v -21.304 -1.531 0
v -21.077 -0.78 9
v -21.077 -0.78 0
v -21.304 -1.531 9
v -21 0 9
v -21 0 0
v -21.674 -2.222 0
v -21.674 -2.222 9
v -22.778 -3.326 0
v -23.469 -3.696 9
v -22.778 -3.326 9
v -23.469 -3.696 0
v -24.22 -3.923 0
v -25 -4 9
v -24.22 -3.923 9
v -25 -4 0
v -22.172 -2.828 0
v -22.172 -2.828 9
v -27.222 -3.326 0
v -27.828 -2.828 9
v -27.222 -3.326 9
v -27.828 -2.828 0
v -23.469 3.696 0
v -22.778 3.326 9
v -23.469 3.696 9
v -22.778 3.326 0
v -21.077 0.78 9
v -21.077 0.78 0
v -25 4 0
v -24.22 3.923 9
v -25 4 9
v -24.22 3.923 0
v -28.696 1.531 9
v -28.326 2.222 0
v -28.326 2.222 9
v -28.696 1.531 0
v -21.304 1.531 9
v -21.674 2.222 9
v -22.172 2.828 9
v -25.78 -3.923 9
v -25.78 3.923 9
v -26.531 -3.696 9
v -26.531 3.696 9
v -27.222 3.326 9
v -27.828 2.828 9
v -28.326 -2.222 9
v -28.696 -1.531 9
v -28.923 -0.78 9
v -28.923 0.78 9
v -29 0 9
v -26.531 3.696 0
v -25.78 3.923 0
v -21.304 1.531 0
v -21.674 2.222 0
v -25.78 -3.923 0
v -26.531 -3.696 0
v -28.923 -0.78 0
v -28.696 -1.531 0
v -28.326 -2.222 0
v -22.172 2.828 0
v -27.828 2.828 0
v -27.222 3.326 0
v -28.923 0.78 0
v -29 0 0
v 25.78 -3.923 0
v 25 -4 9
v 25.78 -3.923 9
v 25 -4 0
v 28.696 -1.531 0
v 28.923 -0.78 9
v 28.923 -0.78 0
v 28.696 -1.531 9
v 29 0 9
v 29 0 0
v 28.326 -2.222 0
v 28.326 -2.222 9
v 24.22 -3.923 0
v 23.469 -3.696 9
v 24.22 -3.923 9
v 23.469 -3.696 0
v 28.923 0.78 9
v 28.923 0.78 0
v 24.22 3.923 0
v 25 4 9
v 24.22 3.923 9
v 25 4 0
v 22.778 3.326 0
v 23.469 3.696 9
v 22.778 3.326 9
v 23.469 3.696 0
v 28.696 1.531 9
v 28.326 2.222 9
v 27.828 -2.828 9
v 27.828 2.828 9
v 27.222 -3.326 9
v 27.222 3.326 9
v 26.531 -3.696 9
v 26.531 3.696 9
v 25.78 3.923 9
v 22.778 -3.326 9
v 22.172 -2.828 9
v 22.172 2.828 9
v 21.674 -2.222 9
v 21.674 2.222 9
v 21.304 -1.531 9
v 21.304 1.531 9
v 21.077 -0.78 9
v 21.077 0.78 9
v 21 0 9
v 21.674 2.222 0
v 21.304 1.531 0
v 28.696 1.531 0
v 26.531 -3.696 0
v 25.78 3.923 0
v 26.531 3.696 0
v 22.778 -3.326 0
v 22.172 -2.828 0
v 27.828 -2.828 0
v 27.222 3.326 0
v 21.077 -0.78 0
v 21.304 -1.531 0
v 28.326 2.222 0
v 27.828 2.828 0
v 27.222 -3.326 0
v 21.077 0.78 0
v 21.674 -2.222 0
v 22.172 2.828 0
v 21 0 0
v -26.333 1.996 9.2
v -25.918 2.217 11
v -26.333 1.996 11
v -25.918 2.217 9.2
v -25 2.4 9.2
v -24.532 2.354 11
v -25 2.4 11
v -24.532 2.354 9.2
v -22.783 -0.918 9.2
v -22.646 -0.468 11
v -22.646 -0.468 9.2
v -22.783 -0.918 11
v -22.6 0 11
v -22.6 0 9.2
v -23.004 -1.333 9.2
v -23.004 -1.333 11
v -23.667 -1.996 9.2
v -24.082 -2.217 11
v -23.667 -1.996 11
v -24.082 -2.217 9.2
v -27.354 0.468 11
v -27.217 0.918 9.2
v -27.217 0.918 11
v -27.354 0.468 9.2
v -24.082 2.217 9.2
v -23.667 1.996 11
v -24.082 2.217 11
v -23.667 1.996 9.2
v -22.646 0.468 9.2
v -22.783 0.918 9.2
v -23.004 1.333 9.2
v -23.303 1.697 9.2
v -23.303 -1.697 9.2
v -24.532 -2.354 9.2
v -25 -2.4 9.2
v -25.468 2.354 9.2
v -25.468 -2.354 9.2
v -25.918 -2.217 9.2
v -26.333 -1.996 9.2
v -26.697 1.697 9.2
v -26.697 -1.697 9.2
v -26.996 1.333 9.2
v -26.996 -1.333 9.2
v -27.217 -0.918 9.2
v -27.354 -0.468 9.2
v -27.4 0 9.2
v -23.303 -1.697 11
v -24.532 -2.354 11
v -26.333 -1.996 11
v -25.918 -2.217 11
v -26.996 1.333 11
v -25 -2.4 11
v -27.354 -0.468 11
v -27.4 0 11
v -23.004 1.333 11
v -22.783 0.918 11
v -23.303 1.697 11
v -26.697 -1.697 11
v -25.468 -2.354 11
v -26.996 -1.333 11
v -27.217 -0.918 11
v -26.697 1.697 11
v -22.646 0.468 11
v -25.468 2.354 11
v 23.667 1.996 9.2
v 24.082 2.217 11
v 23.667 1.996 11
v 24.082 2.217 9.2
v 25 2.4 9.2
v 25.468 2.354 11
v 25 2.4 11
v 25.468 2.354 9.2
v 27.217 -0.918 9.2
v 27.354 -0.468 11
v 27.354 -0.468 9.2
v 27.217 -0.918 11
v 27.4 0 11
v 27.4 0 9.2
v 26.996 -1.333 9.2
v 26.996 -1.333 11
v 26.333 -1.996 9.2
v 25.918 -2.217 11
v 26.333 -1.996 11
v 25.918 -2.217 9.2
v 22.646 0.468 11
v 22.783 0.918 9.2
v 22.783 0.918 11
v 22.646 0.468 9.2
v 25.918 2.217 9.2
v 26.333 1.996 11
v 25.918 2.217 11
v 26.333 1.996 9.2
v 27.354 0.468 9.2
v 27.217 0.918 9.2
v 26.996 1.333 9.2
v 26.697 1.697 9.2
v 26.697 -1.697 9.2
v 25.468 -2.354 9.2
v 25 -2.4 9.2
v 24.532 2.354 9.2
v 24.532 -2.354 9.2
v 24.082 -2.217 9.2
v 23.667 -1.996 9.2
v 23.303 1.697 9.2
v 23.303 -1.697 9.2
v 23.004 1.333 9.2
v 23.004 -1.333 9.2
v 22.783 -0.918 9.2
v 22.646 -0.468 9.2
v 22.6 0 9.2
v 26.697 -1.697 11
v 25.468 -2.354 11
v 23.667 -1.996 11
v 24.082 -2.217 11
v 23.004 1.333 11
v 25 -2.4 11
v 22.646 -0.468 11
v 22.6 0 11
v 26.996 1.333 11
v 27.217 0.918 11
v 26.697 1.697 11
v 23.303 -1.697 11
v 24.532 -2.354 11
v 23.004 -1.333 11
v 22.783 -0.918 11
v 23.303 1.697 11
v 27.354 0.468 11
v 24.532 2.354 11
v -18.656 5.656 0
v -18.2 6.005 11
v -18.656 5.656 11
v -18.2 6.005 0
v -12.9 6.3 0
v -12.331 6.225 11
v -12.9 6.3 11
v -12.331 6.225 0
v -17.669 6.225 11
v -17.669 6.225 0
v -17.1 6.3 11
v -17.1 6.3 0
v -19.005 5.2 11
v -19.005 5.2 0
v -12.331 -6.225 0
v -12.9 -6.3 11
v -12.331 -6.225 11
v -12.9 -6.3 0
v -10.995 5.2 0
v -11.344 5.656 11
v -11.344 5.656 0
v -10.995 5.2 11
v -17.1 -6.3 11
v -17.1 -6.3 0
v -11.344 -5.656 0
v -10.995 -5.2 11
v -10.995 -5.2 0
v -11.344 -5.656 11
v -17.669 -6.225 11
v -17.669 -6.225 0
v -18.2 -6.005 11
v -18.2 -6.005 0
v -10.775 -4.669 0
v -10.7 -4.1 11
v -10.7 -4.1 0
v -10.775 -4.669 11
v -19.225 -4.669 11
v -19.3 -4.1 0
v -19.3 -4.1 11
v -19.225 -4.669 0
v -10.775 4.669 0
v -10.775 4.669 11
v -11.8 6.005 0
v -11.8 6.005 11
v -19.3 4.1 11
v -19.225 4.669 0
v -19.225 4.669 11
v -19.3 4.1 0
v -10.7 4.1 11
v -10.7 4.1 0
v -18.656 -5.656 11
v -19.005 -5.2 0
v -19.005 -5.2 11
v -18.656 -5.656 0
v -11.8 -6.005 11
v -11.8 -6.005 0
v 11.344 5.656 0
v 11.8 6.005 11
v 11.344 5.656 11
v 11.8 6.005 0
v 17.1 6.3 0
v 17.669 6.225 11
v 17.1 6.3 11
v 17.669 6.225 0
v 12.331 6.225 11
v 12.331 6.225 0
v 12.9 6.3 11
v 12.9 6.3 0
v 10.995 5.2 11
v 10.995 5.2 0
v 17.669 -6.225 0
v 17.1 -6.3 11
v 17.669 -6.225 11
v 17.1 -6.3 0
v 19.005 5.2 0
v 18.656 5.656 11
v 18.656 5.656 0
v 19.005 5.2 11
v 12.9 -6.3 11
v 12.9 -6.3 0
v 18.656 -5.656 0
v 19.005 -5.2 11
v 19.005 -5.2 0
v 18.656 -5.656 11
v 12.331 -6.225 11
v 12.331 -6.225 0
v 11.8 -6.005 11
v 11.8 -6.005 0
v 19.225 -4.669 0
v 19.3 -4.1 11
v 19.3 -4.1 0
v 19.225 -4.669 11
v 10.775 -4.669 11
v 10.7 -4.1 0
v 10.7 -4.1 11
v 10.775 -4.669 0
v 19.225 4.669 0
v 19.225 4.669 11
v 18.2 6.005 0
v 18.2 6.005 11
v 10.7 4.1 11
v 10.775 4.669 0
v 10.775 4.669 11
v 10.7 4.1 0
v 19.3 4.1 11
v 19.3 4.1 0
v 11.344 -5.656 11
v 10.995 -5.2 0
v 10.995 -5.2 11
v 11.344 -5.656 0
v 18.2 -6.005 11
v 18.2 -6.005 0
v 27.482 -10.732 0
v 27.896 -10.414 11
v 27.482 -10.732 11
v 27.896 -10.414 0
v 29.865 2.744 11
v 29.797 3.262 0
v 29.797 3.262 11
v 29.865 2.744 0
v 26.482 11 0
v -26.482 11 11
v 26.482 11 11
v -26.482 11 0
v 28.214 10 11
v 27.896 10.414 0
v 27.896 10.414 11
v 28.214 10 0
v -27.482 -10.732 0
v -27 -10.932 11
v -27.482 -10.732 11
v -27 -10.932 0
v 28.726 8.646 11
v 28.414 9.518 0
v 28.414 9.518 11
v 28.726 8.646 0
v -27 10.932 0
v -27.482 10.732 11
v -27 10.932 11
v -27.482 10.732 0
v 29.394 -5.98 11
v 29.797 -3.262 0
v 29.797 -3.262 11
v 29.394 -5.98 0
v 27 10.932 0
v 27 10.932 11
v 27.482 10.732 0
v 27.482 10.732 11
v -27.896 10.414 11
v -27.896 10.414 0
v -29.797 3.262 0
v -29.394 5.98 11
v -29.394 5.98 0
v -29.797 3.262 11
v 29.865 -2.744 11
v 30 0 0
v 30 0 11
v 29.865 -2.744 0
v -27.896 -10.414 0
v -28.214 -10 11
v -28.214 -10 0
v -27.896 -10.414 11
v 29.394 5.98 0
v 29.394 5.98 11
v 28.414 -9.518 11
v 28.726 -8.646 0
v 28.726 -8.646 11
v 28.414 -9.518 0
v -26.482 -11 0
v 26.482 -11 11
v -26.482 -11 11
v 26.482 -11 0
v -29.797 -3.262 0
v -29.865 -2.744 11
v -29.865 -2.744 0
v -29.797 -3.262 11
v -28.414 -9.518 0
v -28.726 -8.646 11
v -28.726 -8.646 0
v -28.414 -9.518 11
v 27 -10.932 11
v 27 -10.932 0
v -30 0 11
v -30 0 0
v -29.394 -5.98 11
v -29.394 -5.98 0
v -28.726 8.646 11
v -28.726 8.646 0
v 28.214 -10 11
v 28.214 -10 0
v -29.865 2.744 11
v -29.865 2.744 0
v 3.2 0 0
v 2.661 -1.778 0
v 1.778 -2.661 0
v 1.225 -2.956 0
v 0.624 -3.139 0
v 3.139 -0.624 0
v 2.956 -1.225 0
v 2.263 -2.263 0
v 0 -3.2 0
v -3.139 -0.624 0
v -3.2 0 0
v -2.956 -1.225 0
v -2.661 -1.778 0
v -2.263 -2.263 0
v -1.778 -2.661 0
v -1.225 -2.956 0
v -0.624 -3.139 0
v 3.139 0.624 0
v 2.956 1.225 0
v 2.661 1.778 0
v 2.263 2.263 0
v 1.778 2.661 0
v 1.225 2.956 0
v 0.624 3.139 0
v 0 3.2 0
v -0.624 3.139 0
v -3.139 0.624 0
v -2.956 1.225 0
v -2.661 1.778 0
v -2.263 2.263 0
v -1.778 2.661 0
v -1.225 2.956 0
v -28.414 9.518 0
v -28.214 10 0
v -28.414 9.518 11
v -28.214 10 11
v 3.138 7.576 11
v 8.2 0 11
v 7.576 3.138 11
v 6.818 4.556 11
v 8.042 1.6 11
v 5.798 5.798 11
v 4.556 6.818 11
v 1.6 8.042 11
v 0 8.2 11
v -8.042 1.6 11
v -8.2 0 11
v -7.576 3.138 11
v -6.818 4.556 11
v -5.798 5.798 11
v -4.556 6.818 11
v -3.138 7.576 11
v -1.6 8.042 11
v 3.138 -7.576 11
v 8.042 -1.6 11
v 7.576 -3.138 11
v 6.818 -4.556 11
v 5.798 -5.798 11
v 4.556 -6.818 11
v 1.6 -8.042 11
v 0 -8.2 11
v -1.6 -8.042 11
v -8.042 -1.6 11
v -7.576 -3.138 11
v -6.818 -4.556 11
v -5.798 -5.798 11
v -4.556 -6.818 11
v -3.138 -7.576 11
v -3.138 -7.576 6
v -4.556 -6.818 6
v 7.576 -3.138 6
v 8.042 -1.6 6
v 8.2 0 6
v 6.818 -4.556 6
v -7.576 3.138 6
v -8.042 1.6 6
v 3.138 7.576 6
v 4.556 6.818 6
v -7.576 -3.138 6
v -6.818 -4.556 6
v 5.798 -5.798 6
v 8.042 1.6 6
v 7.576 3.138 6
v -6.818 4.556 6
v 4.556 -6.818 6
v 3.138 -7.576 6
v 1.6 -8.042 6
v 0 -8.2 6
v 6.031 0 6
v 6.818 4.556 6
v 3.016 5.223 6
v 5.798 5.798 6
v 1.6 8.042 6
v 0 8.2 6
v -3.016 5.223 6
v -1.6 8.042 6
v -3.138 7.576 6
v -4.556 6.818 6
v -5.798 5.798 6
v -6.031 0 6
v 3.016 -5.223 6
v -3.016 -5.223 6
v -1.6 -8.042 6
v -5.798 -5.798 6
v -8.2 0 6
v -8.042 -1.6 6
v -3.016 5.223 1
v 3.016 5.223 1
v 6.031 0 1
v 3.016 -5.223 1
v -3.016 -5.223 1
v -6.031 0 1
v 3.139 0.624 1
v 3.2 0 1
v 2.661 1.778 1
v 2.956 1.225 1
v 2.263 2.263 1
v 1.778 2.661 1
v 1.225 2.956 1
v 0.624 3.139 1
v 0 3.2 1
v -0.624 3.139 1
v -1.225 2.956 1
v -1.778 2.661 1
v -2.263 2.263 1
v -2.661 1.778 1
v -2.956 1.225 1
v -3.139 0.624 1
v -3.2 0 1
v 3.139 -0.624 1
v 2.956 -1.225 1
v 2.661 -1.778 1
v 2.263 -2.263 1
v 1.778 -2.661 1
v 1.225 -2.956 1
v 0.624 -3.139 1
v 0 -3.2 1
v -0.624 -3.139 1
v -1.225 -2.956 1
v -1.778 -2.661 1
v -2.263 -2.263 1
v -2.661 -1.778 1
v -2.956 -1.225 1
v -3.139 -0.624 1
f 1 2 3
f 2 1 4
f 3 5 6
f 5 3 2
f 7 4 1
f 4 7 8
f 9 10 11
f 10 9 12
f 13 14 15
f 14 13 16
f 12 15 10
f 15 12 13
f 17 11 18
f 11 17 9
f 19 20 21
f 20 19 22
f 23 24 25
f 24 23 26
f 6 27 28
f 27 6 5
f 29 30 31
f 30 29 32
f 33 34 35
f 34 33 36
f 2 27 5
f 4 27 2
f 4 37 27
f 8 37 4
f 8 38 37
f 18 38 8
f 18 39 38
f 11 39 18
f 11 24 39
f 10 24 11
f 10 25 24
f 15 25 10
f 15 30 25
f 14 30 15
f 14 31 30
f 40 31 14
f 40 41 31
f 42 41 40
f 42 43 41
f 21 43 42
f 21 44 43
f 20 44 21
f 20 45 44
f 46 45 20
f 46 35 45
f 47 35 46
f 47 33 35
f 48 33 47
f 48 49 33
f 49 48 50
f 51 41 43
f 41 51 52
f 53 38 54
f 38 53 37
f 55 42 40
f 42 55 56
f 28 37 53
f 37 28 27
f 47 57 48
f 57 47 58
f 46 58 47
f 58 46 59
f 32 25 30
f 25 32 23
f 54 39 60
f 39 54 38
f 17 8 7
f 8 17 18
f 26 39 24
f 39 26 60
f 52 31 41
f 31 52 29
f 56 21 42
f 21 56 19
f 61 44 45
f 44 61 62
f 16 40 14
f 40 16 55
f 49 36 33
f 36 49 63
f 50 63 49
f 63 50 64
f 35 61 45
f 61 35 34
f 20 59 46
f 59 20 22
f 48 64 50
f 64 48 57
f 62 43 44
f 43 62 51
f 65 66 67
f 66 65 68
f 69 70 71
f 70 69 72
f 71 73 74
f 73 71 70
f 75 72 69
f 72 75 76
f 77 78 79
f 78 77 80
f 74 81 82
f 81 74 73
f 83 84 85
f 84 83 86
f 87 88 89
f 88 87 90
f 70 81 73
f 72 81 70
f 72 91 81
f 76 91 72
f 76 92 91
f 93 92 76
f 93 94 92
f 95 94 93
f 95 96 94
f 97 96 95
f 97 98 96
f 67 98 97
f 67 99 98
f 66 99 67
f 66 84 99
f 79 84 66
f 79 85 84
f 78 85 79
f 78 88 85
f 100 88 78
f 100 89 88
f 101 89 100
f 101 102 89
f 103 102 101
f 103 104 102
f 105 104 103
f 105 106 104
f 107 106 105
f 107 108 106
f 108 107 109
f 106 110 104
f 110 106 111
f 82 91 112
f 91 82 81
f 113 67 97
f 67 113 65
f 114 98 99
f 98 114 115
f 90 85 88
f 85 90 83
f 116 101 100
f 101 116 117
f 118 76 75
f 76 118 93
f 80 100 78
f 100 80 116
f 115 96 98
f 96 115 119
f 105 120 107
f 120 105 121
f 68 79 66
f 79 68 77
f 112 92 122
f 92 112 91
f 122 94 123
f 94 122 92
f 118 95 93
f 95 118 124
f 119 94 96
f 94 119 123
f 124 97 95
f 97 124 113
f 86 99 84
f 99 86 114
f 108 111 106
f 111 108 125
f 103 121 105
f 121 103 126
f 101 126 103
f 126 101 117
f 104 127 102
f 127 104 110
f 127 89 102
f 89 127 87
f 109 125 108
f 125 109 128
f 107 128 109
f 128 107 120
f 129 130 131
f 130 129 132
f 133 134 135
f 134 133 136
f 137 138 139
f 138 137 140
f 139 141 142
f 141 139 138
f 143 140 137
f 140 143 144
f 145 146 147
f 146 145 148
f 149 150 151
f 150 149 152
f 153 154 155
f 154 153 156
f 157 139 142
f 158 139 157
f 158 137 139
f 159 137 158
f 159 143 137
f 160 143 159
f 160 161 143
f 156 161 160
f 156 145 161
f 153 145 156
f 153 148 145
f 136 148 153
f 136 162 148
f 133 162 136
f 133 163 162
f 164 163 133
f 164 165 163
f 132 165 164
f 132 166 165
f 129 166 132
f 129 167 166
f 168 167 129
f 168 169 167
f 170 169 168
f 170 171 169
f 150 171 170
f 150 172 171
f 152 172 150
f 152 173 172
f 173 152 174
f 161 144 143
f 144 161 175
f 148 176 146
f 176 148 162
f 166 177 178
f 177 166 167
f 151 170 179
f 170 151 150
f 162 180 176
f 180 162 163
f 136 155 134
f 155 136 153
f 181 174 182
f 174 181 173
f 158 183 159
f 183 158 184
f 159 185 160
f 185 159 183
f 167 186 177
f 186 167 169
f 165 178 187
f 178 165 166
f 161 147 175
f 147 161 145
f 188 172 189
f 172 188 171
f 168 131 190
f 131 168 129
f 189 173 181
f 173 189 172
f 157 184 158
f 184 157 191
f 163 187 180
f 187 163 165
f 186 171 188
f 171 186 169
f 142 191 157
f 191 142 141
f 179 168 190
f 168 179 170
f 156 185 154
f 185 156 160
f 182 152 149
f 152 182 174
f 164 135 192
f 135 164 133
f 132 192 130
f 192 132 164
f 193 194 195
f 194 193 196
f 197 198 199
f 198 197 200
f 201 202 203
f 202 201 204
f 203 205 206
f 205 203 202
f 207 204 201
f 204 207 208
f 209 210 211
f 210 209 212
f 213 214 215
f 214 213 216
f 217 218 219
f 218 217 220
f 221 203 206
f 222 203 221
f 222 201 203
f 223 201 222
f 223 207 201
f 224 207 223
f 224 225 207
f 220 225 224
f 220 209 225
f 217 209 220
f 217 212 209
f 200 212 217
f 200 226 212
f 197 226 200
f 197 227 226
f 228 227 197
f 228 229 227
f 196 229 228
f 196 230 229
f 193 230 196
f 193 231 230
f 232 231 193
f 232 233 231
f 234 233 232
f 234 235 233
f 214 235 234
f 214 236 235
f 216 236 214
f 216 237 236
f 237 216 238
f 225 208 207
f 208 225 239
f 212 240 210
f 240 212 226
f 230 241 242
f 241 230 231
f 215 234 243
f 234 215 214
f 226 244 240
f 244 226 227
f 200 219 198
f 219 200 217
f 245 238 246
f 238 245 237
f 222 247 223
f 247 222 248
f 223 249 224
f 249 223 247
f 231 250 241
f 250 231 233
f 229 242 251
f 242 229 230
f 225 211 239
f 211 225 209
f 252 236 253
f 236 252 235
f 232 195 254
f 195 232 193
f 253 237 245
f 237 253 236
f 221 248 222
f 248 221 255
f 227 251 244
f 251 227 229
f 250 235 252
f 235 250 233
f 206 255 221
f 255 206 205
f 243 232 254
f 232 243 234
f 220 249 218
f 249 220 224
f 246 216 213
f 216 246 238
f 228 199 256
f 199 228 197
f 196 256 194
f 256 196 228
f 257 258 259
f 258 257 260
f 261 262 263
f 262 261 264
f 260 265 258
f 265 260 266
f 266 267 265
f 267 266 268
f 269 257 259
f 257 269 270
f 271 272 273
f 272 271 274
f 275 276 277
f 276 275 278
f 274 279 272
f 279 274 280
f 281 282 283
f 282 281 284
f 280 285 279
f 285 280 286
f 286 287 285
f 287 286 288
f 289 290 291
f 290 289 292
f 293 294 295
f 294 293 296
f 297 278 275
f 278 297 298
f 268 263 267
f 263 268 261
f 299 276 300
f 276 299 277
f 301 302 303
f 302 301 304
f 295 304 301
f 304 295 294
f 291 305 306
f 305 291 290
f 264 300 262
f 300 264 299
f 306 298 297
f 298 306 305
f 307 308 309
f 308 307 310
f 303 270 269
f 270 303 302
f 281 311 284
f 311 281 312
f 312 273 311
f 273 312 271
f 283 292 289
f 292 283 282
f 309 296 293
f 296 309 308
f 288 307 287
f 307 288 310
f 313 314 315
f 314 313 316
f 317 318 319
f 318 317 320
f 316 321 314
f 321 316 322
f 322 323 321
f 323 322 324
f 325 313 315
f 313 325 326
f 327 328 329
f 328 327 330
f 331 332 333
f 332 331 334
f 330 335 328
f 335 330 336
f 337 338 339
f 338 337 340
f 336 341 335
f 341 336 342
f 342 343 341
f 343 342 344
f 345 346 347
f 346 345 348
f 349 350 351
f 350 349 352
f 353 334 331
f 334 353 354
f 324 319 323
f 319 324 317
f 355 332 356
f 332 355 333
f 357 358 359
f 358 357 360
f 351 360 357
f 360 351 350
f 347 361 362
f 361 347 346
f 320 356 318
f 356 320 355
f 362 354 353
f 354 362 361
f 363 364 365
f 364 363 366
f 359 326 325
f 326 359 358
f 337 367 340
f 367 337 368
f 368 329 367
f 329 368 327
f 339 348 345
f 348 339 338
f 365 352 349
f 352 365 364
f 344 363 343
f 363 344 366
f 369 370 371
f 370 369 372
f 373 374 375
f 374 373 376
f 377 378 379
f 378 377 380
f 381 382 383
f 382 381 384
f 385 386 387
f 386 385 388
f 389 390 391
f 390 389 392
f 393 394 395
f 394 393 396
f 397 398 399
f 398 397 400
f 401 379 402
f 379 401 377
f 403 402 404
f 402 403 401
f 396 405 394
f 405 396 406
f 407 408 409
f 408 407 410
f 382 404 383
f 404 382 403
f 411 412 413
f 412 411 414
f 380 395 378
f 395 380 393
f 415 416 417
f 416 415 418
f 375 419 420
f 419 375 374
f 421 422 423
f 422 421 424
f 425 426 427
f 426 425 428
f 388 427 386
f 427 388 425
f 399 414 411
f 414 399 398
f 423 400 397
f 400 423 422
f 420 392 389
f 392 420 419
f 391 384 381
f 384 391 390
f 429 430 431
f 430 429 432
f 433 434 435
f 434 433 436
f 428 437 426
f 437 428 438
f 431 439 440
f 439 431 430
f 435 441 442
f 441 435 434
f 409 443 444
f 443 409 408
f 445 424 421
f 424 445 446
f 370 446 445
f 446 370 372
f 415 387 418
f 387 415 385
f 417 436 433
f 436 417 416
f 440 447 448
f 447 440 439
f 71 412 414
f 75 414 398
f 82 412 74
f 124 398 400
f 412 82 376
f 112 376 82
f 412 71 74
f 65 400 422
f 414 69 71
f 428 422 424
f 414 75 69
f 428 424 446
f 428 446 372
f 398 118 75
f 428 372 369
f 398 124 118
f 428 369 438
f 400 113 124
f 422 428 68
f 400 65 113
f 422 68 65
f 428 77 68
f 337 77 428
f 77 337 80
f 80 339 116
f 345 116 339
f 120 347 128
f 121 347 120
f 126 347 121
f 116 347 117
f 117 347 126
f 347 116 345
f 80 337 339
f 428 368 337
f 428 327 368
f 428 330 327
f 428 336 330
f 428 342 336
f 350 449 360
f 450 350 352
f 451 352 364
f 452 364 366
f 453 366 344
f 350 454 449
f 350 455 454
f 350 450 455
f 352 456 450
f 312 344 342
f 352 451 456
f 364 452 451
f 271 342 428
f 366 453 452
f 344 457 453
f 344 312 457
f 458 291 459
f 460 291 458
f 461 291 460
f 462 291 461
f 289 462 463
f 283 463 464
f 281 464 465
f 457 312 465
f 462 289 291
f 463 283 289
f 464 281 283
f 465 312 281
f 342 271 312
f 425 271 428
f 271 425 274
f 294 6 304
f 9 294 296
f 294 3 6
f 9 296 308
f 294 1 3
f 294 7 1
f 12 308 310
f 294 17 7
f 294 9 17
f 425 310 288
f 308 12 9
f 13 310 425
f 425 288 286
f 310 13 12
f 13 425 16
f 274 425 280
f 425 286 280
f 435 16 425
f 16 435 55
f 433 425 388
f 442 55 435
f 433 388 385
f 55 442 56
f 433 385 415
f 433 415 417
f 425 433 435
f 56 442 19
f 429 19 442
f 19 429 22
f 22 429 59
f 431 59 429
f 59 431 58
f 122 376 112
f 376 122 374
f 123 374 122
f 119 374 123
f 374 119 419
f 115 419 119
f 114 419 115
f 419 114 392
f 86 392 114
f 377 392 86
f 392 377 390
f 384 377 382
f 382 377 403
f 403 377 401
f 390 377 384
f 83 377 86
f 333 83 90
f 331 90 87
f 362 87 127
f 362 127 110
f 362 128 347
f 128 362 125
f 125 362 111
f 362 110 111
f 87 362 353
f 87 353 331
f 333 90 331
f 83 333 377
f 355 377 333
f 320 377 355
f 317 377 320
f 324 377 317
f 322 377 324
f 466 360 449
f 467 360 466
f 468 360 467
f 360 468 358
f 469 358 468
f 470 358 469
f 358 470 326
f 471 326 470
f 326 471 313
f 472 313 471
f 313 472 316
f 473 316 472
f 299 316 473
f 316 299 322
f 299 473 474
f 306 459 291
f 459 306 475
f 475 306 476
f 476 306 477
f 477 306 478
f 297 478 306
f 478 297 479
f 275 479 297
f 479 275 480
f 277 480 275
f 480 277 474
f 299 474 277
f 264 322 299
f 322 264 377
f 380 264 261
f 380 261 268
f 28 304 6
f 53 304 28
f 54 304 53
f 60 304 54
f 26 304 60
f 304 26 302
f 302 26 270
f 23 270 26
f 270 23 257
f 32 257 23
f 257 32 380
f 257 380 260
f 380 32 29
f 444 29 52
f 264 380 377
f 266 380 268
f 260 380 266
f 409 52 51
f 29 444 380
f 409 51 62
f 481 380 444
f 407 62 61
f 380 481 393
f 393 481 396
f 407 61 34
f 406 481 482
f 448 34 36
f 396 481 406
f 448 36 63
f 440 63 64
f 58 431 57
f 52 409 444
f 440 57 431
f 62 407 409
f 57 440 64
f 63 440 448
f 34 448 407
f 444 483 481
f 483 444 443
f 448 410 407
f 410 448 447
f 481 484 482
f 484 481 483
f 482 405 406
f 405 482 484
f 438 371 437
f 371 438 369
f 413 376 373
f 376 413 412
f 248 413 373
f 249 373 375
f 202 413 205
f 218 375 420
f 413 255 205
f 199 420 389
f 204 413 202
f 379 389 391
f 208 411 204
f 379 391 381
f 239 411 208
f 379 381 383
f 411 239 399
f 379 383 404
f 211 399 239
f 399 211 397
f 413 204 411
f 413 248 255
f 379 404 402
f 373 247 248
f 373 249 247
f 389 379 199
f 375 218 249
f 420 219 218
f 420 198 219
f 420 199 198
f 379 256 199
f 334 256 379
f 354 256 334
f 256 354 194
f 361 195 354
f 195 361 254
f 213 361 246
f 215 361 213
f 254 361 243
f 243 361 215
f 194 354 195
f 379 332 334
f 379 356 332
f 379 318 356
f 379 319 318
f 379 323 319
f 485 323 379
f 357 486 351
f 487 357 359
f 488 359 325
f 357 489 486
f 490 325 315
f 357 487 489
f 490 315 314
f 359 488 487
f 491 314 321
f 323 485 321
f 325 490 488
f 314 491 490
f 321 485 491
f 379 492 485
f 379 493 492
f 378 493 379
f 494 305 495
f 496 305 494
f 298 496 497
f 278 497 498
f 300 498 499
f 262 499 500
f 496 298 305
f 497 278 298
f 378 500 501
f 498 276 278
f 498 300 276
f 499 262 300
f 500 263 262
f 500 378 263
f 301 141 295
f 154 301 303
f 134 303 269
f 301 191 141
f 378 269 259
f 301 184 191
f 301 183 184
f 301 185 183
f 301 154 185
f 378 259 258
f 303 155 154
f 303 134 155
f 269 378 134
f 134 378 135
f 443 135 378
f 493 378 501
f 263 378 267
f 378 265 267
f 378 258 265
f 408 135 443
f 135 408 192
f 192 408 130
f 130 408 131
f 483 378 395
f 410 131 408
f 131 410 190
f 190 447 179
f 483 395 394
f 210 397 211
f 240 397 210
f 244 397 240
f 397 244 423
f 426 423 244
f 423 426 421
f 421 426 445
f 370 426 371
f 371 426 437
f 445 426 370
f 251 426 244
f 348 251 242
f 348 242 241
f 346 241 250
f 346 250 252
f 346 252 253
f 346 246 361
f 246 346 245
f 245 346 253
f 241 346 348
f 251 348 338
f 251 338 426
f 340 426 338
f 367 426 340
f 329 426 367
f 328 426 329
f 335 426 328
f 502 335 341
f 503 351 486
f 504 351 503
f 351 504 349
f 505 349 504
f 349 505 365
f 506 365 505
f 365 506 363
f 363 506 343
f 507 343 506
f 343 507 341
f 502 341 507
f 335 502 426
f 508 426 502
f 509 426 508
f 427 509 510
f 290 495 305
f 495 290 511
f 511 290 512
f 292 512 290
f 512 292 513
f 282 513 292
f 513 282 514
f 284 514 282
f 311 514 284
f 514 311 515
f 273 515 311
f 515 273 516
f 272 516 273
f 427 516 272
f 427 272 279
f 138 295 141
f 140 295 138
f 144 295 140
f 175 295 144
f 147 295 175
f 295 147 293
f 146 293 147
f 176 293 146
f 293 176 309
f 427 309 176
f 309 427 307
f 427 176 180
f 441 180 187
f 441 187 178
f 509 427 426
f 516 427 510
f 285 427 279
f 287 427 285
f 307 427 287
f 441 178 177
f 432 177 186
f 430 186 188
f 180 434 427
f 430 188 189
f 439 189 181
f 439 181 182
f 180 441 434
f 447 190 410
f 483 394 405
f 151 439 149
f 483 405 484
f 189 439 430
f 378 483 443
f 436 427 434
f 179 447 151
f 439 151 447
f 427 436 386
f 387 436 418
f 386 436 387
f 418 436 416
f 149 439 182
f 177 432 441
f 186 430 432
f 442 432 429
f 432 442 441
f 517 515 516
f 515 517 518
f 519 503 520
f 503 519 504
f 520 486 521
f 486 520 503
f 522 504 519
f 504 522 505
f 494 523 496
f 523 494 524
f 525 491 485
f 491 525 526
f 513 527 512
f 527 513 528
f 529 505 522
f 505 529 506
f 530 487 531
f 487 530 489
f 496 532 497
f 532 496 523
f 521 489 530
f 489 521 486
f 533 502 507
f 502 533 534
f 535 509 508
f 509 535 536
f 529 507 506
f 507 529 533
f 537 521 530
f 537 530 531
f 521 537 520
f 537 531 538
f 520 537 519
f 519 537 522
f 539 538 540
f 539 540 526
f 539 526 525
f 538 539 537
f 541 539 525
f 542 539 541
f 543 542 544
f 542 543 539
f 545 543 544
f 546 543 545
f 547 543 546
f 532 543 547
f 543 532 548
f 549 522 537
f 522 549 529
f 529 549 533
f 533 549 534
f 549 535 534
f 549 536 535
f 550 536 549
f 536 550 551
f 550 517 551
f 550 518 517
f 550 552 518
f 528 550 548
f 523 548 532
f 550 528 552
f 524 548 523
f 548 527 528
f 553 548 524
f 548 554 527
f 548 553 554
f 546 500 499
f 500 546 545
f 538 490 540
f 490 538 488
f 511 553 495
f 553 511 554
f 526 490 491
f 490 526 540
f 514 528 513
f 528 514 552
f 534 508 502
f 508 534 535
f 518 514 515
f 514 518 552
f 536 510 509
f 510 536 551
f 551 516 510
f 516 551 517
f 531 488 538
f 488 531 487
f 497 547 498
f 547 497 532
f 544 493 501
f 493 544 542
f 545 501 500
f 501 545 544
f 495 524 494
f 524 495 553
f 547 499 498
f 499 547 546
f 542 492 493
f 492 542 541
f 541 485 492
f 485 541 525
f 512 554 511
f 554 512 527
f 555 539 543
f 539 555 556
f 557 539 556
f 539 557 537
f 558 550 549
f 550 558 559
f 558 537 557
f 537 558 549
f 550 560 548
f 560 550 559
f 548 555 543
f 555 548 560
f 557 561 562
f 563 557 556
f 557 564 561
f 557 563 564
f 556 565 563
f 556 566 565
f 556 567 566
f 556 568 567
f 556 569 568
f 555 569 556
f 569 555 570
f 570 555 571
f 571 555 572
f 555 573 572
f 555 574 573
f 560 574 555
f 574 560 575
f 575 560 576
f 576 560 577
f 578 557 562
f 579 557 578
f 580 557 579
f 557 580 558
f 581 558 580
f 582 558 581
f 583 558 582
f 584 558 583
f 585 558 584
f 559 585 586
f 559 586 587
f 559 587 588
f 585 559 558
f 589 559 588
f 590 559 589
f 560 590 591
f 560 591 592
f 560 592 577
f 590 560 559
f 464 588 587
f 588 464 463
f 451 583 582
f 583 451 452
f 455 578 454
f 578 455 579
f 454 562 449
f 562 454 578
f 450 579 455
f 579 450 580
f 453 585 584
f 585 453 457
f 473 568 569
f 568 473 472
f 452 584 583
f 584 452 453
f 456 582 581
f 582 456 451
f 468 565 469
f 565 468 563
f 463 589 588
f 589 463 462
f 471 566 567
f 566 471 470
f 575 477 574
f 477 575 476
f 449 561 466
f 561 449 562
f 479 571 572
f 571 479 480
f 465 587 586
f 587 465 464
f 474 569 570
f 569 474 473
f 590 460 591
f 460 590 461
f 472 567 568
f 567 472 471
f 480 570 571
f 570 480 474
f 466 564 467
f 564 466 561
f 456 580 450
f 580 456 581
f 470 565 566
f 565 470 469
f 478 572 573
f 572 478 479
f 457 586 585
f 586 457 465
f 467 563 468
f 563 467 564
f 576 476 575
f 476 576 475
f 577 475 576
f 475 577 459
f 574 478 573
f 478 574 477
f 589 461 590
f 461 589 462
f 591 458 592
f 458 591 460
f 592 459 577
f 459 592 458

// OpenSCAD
module bowden_clamp() difference() {
	linear_extrude(height=11,convexity=30) difference() {
		// basic shape
		minkowski() {
			intersection() {
				square([60-2,22-4],center=true);
				circle(r=30-2,$fn=64);
			}
			// rounded corners
			circle(r=2,$fn=24);
		}
	}
	// M4 socket heads
	for(x=[-25,25]) translate([x,0,2])
		cylinder(r=4,h=12,$fn=32);

	// M4 Mounting holes
	for(x=[-25,25]) translate([x,0,-1])
		cylinder(r=2.4,h=2.8,$fn=32);

	// groove mount
	translate([0,0,-1]) cylinder(r=8.2,h=6,$fn=32);

	// M6 captive nut
	cylinder(r=10.1/sqrt(3)+0.2,h=10,$fn=6);

	// M6 pneumatic fitting
	cylinder(r=3.2,h=14,$fn=32);

	// unnecessary vents
	for(x=[-15,15]) translate([x,0,-1]) minkowski() {
		cube([4.2,8.2,13],center=true);
		cylinder(r=2.2,h=13,$fn=24);
	}
}

module wood_mount() difference() {
	// basic shape
	minkowski() {
		intersection() {
			square([60-1.8,22-3.6],center=true);
			circle(r=30-1.8,$fn=64);
		}
		// rounded corners
		circle(r=2,$fn=24);
	}
	// M4 Mounting holes
	for(x=[-25,25]) translate([x,0])
		circle(r=2,$fn=32);

	// groove mount
	circle(r=5.9,$fn=32);
	translate([0,-11]) square([11.8,22], center=true);

	// unnecessary vents
	for(x=[-15,15]) translate([x,0]) minkowski() {
		square([4,8],center=true);
		circle(r=2,$fn=24);
	}

}

%translate([0,0,-5]) linear_extrude(height=5,convexity=30) wood_mount();
bowden_clamp();

!translate([0,0,11]) rotate([180,0,0]) bowden_clamp();
*!wood_mount();
